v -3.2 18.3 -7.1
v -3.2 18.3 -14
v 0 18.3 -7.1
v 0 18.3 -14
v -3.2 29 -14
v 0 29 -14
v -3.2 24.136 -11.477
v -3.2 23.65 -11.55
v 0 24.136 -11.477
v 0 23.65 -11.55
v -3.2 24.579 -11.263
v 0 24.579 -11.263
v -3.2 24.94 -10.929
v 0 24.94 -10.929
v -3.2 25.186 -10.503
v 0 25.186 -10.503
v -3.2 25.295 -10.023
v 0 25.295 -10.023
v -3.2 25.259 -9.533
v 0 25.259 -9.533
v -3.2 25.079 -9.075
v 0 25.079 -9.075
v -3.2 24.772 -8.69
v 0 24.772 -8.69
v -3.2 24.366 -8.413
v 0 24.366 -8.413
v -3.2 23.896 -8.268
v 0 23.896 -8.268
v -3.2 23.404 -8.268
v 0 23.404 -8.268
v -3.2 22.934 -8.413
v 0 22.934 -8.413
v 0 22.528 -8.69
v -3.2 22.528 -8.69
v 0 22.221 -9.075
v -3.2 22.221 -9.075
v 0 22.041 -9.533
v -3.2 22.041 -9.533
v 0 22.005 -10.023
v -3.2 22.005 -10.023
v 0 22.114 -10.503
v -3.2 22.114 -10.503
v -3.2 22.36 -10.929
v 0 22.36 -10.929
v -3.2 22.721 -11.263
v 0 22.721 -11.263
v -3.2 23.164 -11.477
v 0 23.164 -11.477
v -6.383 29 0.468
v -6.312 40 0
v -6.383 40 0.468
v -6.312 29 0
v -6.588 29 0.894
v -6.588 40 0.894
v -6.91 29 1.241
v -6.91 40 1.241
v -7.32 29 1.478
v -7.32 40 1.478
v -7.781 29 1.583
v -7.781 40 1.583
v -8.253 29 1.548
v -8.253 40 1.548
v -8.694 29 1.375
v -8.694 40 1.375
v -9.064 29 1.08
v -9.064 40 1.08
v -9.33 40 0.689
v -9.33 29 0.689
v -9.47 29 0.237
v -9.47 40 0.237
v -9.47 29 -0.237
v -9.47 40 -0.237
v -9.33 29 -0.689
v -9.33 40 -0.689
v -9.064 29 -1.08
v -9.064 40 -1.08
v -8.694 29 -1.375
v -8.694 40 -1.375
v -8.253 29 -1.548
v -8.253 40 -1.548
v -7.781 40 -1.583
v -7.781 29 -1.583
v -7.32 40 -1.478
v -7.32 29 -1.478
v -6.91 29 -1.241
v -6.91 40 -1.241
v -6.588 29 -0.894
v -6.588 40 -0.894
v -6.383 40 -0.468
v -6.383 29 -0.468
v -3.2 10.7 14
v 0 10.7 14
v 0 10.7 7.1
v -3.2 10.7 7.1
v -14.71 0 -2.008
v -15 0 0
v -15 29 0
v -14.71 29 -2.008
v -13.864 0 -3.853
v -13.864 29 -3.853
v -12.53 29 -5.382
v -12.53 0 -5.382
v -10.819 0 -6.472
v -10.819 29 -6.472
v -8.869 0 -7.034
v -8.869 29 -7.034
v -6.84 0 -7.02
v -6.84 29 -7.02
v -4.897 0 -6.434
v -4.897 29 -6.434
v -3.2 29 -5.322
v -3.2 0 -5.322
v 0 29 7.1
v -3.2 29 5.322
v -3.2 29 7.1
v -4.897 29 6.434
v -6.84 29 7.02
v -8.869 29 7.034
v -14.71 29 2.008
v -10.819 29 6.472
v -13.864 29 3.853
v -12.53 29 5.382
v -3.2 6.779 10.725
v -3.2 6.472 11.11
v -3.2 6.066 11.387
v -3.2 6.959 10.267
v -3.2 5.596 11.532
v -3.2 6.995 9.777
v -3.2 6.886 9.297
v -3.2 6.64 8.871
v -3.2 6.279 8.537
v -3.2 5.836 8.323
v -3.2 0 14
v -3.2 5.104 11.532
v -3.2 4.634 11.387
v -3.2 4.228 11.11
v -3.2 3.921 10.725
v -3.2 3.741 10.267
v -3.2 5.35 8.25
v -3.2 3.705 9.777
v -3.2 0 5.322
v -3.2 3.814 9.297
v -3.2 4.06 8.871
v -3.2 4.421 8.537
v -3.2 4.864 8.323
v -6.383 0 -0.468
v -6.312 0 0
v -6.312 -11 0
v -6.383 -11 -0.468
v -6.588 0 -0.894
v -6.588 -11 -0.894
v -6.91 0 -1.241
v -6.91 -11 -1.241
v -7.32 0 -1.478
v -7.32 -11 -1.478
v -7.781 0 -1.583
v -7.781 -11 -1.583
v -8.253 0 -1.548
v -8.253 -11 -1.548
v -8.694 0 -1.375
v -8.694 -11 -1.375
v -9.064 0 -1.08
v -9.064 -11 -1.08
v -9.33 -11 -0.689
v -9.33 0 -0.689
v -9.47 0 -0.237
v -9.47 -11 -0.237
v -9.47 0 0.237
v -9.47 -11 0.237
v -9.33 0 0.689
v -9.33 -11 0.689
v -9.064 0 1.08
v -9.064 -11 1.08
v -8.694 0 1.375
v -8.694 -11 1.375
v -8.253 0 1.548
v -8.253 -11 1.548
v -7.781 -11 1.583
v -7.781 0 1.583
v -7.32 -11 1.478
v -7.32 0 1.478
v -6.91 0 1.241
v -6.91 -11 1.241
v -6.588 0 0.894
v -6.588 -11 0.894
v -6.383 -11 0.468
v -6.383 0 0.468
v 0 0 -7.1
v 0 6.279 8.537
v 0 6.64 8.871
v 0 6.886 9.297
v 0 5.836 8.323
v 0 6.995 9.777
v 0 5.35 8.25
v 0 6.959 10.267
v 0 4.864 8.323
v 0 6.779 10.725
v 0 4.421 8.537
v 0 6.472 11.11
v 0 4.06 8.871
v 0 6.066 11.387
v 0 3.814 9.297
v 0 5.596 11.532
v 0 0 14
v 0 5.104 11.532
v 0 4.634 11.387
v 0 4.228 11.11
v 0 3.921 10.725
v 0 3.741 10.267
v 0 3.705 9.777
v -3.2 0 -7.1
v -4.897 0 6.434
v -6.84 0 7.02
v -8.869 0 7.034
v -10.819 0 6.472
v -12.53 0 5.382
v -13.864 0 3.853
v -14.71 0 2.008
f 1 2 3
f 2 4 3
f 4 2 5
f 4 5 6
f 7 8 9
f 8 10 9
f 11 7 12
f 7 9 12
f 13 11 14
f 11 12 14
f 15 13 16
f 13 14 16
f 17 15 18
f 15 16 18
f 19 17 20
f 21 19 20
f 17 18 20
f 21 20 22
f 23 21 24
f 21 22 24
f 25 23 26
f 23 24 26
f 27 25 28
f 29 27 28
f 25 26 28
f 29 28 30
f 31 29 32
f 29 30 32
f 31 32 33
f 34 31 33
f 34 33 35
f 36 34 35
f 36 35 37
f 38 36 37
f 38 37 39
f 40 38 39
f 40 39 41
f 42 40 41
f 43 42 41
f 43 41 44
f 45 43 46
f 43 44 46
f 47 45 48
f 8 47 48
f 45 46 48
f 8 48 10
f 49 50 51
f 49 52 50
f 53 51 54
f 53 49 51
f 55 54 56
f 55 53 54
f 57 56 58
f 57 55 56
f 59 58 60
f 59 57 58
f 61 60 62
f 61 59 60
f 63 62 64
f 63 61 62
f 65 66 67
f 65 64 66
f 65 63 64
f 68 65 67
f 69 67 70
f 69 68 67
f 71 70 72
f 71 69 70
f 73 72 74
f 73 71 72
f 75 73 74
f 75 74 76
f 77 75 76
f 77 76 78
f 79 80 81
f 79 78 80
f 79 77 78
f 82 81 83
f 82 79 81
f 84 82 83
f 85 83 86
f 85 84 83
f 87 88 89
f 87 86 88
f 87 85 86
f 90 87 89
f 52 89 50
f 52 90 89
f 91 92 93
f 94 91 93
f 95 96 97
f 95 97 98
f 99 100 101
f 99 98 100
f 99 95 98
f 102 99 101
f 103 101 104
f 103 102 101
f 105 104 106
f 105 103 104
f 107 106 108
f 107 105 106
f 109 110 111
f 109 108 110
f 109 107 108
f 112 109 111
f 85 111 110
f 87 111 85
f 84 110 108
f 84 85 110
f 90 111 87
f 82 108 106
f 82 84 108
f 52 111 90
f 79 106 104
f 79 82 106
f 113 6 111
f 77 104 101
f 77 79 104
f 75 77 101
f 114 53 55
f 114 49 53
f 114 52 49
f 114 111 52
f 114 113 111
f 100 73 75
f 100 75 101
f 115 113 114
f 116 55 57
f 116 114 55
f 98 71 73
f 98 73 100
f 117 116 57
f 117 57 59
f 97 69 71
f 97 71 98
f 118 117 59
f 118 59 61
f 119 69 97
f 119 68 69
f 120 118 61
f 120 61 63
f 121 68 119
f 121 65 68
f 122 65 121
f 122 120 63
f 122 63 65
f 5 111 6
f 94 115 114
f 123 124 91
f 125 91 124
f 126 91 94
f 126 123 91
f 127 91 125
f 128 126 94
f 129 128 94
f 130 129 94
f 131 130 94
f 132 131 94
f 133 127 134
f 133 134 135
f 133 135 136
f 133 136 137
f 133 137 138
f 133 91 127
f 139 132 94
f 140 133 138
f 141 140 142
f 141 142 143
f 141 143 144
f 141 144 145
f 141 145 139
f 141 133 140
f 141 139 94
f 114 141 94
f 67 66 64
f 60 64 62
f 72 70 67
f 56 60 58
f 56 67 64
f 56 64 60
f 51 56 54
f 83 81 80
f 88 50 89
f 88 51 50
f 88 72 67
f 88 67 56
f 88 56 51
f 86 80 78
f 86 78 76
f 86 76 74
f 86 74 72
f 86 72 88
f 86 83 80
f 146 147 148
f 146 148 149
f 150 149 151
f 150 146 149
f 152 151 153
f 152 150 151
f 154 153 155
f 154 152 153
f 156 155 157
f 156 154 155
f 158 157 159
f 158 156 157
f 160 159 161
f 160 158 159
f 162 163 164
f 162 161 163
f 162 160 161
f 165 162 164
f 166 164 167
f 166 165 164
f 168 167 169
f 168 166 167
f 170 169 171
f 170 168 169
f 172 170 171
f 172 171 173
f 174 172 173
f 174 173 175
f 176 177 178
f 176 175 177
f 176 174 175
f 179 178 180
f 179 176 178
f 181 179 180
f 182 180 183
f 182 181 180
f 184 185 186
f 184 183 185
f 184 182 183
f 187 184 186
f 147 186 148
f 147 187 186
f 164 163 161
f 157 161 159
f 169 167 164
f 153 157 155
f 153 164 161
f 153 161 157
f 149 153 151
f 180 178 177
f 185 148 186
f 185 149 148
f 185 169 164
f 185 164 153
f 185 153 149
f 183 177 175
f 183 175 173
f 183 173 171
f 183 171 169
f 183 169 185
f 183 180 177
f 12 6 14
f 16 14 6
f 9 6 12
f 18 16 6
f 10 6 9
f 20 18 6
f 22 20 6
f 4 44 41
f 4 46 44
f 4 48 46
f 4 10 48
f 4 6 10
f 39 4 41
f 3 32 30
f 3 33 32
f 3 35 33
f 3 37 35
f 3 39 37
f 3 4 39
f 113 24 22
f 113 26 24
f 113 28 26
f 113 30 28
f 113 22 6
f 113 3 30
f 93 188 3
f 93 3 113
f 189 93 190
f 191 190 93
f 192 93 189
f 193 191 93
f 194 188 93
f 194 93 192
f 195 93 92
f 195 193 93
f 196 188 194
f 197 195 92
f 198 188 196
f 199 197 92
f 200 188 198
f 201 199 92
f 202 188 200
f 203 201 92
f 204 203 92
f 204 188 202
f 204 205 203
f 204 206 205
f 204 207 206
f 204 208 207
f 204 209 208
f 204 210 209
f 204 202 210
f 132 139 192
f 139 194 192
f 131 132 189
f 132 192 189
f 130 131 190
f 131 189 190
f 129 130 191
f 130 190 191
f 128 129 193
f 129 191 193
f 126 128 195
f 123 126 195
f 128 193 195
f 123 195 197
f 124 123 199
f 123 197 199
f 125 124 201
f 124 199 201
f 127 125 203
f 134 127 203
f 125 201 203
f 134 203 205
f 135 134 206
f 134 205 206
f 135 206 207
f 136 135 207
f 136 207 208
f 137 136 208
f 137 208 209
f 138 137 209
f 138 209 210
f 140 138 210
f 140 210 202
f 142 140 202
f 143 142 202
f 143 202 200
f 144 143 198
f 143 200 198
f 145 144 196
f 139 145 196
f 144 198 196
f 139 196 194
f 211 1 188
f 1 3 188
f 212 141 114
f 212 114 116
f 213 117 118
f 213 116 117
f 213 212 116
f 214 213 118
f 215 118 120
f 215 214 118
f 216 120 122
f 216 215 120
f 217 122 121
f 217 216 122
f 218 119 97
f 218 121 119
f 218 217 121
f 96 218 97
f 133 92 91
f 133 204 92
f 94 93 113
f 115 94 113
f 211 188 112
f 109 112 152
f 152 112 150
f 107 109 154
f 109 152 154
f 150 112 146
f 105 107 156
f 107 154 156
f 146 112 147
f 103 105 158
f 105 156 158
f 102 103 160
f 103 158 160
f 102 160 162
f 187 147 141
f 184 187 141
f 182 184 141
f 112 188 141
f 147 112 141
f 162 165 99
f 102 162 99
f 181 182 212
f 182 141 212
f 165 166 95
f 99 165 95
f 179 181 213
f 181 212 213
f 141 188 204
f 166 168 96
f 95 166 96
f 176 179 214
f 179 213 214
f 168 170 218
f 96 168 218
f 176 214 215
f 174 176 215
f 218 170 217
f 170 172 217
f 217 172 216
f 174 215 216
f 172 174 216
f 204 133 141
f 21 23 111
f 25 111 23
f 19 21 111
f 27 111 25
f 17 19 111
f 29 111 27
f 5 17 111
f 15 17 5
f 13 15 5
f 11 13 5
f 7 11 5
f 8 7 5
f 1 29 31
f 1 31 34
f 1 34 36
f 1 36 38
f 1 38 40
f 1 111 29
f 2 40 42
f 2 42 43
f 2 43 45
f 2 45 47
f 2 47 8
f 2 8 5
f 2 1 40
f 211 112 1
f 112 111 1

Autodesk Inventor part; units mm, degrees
ref_plane "YZ Plane" through (0, 0, 0) normal (1, 0, 0) x (0, 1, 0)
ref_plane "XZ Plane" through (0, 0, 0) normal (0, 1, 0) x (-1, 0, 0)
ref_plane "XY Plane" through (0, 0, 0) normal (0, 0, 1) x (1, 0, 0)
sketch "Sketch1" plane through (0, 0, 0) normal (0, 1, 0) x (-1, 0, 0)
  arc A0 (3.2, -5.3217) -> (15, 0) centre (7.9, 0) ccw
  line L0 (3.2, -5.3217) -> (3.2, -14)
  line L1 (3.2, -14) -> (0, -14)
  line L2 (0, -14) -> (0, 14)
  line L3 (0, 14) -> (3.2, 14)
  line L4 (3.2, 14) -> (3.2, 5.3217)
  arc A1 (15, 0) -> (3.2, 5.3217) centre (7.9, 0) ccw
  line L5 (7.9, 7.1) -> (7.9, -7.1) construction
  line L6 (3.2, 5.3217) -> (15, 0) construction
  line L7 (3.2, -5.3217) -> (15, 0) construction
  point P0 (0, 0)
  point P1 (0, 0)
  dimension "d0" = 3.2
  dimension "d1" = 28
  dimension "d5" = 14.2
  dimension "d6" = 15
extrude "Extrusion1" add sketch "Sketch1" along normal blind 29
sketch "Sketch2" plane through (0, 0, 14) normal (1, 0, 0) x (0, 0, -1)
  circle A0 centre (23.9, 23.65) radius 1.65
  circle A1 centre (4.1, 5.35) radius 1.65
  line L0 (23.9, 23.65) -> (23.9, 5.35) construction
  line L1 (23.9, 5.35) -> (4.1, 5.35) construction
  line L2 (28, 0) -> (28, 29) projected
  line L3 (0, 0) -> (0, 29) projected
  line L4 (23.9, 23.65) -> (28, 23.65) construction
  line L5 (23.9, 23.65) -> (28, 29) construction
  line L6 (0, 0) -> (4.1, 5.35) construction
  line L7 (4.1, 5.35) -> (0, 5.35) construction
  line L8 (28, 18.3) -> (21.1, 18.3)
  line L9 (21.1, 18.3) -> (21.1, 0)
  line L10 (21.1, 0) -> (28, 0)
  line L11 (0, 10.7) -> (6.9, 10.7)
  line L12 (6.9, 10.7) -> (6.9, 29)
  line L13 (6.9, 29) -> (0, 29)
  line L14 (28, 18.3) -> (23.9, 23.65) construction
  point P0 (14, 0)
  dimension "d9" = 19.8
  dimension "d10" = 18.3
  dimension "d11" = 3.3
  dimension "d12" = 2.8
extrude "Extrusion2" cut sketch "Sketch2" against normal up to surface (3.2 mm away)
sketch "Sketch3" plane through (0, 0, 0) normal (0, -1, 0) x (1, 0, 0)
  arc A0 (-3.2, 5.3217) -> (-3.2, -5.3217) centre (-7.9, 0) ccw projected
  circle A1 centre (-7.9, 0) radius 1.5875
  point P0 (0, 0)
  dimension "d15" = 3.175
extrude "Extrusion3" add sketch "Sketch3" along normal blind 11
sketch "Sketch4" plane through (0, 29, 0) normal (0, 1, 0) x (1, 0, 0)
  arc A0 (-3.2, 5.3217) -> (-3.2, -5.3217) centre (-7.9, 0) ccw construction
  circle A1 centre (-7.9, 0) radius 1.5875
  point P0 (0, 0)
  dimension "d18" = 3.175
extrude "Extrusion4" add sketch "Sketch4" along normal blind 11
properties part number "Power Resistor - HSA25" material "Gold"
